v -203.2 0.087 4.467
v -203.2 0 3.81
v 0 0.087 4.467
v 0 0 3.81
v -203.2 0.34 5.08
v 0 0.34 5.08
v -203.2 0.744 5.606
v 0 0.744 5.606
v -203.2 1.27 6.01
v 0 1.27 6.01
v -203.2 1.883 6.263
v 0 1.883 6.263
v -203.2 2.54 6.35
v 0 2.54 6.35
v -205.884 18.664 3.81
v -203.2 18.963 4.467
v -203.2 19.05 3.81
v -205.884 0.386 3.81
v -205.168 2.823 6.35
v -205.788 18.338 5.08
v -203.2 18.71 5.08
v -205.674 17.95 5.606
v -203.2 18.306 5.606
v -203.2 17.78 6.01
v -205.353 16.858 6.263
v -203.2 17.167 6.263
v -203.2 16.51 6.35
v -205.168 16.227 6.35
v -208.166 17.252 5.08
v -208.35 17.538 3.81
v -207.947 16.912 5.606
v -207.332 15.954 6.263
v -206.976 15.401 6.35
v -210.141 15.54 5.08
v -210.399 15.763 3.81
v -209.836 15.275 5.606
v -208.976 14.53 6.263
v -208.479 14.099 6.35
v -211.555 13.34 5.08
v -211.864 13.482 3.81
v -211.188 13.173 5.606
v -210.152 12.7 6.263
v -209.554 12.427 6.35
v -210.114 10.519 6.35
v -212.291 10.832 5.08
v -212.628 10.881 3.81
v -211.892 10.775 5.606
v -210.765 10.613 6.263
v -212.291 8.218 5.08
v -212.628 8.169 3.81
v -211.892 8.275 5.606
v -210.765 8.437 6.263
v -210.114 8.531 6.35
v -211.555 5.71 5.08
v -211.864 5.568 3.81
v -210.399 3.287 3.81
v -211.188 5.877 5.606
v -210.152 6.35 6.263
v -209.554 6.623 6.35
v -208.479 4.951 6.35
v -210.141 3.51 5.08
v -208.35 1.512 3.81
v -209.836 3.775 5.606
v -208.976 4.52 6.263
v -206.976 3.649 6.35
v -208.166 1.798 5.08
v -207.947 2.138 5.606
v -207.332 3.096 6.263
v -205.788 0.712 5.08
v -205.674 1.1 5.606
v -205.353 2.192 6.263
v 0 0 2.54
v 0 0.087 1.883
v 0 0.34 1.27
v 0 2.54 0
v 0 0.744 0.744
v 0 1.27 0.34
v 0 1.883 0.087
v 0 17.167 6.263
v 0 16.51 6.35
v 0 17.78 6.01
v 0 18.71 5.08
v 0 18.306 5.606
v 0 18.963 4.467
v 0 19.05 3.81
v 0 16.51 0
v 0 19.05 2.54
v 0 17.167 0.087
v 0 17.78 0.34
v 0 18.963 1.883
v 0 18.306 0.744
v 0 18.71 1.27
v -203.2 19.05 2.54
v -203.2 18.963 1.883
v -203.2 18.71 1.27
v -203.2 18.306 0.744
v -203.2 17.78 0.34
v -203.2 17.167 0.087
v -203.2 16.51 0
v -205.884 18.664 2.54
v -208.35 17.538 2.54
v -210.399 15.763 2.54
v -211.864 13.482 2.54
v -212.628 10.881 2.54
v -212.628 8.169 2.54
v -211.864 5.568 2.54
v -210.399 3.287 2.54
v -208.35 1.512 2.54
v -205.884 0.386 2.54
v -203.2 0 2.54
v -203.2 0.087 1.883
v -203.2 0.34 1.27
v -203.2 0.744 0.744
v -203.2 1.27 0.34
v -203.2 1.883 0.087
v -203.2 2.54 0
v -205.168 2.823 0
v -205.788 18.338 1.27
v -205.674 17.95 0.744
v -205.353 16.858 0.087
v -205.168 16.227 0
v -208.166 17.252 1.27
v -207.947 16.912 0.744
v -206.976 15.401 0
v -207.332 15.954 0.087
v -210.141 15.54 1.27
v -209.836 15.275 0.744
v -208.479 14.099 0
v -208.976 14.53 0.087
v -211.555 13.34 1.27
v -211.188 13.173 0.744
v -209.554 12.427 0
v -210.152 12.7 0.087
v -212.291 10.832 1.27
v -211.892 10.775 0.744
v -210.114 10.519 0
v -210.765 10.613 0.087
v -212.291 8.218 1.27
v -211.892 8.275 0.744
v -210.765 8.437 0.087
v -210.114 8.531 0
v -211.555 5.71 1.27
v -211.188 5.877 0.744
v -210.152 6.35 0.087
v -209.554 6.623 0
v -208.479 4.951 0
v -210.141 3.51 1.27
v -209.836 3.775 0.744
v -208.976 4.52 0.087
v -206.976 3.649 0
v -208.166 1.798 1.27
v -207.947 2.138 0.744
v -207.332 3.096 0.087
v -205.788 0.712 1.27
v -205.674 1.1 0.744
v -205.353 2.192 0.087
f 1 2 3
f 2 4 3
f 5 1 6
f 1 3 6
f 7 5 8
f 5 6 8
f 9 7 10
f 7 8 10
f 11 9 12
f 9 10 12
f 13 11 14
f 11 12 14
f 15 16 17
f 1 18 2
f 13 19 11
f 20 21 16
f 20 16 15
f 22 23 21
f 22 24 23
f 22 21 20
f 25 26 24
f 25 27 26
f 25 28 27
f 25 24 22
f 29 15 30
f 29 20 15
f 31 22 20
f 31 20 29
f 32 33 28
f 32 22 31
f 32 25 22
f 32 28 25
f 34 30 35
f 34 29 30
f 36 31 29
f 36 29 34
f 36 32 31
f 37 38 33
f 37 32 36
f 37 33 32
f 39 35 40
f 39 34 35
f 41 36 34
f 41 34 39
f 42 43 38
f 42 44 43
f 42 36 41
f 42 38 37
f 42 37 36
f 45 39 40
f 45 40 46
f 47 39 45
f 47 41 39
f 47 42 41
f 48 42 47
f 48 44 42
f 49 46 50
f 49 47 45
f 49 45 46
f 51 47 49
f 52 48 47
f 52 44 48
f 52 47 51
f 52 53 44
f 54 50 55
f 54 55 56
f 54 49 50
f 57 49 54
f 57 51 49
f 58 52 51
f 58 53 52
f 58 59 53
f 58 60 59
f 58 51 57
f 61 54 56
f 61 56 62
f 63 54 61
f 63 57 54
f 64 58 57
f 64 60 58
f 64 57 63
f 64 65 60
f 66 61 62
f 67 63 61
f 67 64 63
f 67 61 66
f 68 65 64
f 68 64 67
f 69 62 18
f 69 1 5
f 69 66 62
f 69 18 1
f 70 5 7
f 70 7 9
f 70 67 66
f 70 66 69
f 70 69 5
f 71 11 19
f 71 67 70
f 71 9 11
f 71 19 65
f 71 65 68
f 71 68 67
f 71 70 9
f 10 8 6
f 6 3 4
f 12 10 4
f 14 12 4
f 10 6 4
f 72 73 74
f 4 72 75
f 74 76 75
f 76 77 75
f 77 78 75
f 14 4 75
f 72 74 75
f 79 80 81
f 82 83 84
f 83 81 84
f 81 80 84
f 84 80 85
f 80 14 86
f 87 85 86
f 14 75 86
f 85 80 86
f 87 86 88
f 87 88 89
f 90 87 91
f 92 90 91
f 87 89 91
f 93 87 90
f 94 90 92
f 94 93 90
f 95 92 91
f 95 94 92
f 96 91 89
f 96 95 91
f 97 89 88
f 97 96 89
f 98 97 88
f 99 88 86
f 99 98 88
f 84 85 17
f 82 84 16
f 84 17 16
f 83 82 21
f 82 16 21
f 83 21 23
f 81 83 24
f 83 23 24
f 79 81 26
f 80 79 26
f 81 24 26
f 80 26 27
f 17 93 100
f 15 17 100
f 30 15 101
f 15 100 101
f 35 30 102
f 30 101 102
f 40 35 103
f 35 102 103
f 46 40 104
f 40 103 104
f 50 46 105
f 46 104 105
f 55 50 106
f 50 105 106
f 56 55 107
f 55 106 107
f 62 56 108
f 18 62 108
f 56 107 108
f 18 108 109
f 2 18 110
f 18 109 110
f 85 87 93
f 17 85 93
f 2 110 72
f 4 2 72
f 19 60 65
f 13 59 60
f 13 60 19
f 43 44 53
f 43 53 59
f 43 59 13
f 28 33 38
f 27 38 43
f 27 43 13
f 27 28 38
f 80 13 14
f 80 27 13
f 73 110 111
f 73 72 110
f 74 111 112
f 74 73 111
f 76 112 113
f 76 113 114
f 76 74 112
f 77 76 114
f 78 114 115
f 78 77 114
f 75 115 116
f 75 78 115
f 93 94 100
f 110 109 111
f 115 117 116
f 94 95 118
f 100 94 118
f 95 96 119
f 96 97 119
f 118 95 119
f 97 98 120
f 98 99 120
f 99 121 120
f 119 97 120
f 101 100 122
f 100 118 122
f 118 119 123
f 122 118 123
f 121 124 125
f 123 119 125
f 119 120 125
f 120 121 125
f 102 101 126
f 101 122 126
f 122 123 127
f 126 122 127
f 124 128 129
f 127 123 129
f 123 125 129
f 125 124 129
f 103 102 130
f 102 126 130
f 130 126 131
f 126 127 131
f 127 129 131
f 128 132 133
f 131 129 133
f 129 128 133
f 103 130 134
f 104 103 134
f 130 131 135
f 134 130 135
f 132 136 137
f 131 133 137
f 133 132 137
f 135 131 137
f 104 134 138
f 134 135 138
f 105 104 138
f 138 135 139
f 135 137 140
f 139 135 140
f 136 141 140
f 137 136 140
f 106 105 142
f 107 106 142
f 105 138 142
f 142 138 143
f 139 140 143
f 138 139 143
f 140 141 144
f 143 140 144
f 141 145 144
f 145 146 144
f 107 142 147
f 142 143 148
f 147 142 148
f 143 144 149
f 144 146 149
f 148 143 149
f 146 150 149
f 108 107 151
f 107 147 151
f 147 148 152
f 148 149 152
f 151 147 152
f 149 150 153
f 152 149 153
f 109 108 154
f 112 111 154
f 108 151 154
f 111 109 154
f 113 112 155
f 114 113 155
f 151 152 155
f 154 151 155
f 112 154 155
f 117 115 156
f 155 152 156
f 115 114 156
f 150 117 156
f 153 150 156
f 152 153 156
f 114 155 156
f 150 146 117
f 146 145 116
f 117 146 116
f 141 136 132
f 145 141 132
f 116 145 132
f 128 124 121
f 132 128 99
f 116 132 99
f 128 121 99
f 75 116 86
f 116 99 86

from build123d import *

# Parameters (mm, degrees)
F1_DEPTH = 6.35
F2_R     = 2.54


with BuildPart() as f1:
    # F0 (on Top) → F1 (new body)
    with BuildSketch(Plane.XY):
        with BuildLine():
            Line((-203.2, 0), (0, 0))
            Line((0, 0), (0, 19.05))
            Line((0, 19.05), (-203.2, 19.05))
            ThreePointArc((-203.2, 19.05), (-212.725, 9.525), (-203.2, 0))
        make_face()
    extrude(amount=F1_DEPTH)

    # F2
    f2_edges = [f1.edges().sort_by_distance(p)[0] for p in [
        (-101.6, 19.05, 0),
        (-101.6, 19.05, 6.35),
    ]]
    fillet(f2_edges, radius=F2_R)


solid = f1.part
